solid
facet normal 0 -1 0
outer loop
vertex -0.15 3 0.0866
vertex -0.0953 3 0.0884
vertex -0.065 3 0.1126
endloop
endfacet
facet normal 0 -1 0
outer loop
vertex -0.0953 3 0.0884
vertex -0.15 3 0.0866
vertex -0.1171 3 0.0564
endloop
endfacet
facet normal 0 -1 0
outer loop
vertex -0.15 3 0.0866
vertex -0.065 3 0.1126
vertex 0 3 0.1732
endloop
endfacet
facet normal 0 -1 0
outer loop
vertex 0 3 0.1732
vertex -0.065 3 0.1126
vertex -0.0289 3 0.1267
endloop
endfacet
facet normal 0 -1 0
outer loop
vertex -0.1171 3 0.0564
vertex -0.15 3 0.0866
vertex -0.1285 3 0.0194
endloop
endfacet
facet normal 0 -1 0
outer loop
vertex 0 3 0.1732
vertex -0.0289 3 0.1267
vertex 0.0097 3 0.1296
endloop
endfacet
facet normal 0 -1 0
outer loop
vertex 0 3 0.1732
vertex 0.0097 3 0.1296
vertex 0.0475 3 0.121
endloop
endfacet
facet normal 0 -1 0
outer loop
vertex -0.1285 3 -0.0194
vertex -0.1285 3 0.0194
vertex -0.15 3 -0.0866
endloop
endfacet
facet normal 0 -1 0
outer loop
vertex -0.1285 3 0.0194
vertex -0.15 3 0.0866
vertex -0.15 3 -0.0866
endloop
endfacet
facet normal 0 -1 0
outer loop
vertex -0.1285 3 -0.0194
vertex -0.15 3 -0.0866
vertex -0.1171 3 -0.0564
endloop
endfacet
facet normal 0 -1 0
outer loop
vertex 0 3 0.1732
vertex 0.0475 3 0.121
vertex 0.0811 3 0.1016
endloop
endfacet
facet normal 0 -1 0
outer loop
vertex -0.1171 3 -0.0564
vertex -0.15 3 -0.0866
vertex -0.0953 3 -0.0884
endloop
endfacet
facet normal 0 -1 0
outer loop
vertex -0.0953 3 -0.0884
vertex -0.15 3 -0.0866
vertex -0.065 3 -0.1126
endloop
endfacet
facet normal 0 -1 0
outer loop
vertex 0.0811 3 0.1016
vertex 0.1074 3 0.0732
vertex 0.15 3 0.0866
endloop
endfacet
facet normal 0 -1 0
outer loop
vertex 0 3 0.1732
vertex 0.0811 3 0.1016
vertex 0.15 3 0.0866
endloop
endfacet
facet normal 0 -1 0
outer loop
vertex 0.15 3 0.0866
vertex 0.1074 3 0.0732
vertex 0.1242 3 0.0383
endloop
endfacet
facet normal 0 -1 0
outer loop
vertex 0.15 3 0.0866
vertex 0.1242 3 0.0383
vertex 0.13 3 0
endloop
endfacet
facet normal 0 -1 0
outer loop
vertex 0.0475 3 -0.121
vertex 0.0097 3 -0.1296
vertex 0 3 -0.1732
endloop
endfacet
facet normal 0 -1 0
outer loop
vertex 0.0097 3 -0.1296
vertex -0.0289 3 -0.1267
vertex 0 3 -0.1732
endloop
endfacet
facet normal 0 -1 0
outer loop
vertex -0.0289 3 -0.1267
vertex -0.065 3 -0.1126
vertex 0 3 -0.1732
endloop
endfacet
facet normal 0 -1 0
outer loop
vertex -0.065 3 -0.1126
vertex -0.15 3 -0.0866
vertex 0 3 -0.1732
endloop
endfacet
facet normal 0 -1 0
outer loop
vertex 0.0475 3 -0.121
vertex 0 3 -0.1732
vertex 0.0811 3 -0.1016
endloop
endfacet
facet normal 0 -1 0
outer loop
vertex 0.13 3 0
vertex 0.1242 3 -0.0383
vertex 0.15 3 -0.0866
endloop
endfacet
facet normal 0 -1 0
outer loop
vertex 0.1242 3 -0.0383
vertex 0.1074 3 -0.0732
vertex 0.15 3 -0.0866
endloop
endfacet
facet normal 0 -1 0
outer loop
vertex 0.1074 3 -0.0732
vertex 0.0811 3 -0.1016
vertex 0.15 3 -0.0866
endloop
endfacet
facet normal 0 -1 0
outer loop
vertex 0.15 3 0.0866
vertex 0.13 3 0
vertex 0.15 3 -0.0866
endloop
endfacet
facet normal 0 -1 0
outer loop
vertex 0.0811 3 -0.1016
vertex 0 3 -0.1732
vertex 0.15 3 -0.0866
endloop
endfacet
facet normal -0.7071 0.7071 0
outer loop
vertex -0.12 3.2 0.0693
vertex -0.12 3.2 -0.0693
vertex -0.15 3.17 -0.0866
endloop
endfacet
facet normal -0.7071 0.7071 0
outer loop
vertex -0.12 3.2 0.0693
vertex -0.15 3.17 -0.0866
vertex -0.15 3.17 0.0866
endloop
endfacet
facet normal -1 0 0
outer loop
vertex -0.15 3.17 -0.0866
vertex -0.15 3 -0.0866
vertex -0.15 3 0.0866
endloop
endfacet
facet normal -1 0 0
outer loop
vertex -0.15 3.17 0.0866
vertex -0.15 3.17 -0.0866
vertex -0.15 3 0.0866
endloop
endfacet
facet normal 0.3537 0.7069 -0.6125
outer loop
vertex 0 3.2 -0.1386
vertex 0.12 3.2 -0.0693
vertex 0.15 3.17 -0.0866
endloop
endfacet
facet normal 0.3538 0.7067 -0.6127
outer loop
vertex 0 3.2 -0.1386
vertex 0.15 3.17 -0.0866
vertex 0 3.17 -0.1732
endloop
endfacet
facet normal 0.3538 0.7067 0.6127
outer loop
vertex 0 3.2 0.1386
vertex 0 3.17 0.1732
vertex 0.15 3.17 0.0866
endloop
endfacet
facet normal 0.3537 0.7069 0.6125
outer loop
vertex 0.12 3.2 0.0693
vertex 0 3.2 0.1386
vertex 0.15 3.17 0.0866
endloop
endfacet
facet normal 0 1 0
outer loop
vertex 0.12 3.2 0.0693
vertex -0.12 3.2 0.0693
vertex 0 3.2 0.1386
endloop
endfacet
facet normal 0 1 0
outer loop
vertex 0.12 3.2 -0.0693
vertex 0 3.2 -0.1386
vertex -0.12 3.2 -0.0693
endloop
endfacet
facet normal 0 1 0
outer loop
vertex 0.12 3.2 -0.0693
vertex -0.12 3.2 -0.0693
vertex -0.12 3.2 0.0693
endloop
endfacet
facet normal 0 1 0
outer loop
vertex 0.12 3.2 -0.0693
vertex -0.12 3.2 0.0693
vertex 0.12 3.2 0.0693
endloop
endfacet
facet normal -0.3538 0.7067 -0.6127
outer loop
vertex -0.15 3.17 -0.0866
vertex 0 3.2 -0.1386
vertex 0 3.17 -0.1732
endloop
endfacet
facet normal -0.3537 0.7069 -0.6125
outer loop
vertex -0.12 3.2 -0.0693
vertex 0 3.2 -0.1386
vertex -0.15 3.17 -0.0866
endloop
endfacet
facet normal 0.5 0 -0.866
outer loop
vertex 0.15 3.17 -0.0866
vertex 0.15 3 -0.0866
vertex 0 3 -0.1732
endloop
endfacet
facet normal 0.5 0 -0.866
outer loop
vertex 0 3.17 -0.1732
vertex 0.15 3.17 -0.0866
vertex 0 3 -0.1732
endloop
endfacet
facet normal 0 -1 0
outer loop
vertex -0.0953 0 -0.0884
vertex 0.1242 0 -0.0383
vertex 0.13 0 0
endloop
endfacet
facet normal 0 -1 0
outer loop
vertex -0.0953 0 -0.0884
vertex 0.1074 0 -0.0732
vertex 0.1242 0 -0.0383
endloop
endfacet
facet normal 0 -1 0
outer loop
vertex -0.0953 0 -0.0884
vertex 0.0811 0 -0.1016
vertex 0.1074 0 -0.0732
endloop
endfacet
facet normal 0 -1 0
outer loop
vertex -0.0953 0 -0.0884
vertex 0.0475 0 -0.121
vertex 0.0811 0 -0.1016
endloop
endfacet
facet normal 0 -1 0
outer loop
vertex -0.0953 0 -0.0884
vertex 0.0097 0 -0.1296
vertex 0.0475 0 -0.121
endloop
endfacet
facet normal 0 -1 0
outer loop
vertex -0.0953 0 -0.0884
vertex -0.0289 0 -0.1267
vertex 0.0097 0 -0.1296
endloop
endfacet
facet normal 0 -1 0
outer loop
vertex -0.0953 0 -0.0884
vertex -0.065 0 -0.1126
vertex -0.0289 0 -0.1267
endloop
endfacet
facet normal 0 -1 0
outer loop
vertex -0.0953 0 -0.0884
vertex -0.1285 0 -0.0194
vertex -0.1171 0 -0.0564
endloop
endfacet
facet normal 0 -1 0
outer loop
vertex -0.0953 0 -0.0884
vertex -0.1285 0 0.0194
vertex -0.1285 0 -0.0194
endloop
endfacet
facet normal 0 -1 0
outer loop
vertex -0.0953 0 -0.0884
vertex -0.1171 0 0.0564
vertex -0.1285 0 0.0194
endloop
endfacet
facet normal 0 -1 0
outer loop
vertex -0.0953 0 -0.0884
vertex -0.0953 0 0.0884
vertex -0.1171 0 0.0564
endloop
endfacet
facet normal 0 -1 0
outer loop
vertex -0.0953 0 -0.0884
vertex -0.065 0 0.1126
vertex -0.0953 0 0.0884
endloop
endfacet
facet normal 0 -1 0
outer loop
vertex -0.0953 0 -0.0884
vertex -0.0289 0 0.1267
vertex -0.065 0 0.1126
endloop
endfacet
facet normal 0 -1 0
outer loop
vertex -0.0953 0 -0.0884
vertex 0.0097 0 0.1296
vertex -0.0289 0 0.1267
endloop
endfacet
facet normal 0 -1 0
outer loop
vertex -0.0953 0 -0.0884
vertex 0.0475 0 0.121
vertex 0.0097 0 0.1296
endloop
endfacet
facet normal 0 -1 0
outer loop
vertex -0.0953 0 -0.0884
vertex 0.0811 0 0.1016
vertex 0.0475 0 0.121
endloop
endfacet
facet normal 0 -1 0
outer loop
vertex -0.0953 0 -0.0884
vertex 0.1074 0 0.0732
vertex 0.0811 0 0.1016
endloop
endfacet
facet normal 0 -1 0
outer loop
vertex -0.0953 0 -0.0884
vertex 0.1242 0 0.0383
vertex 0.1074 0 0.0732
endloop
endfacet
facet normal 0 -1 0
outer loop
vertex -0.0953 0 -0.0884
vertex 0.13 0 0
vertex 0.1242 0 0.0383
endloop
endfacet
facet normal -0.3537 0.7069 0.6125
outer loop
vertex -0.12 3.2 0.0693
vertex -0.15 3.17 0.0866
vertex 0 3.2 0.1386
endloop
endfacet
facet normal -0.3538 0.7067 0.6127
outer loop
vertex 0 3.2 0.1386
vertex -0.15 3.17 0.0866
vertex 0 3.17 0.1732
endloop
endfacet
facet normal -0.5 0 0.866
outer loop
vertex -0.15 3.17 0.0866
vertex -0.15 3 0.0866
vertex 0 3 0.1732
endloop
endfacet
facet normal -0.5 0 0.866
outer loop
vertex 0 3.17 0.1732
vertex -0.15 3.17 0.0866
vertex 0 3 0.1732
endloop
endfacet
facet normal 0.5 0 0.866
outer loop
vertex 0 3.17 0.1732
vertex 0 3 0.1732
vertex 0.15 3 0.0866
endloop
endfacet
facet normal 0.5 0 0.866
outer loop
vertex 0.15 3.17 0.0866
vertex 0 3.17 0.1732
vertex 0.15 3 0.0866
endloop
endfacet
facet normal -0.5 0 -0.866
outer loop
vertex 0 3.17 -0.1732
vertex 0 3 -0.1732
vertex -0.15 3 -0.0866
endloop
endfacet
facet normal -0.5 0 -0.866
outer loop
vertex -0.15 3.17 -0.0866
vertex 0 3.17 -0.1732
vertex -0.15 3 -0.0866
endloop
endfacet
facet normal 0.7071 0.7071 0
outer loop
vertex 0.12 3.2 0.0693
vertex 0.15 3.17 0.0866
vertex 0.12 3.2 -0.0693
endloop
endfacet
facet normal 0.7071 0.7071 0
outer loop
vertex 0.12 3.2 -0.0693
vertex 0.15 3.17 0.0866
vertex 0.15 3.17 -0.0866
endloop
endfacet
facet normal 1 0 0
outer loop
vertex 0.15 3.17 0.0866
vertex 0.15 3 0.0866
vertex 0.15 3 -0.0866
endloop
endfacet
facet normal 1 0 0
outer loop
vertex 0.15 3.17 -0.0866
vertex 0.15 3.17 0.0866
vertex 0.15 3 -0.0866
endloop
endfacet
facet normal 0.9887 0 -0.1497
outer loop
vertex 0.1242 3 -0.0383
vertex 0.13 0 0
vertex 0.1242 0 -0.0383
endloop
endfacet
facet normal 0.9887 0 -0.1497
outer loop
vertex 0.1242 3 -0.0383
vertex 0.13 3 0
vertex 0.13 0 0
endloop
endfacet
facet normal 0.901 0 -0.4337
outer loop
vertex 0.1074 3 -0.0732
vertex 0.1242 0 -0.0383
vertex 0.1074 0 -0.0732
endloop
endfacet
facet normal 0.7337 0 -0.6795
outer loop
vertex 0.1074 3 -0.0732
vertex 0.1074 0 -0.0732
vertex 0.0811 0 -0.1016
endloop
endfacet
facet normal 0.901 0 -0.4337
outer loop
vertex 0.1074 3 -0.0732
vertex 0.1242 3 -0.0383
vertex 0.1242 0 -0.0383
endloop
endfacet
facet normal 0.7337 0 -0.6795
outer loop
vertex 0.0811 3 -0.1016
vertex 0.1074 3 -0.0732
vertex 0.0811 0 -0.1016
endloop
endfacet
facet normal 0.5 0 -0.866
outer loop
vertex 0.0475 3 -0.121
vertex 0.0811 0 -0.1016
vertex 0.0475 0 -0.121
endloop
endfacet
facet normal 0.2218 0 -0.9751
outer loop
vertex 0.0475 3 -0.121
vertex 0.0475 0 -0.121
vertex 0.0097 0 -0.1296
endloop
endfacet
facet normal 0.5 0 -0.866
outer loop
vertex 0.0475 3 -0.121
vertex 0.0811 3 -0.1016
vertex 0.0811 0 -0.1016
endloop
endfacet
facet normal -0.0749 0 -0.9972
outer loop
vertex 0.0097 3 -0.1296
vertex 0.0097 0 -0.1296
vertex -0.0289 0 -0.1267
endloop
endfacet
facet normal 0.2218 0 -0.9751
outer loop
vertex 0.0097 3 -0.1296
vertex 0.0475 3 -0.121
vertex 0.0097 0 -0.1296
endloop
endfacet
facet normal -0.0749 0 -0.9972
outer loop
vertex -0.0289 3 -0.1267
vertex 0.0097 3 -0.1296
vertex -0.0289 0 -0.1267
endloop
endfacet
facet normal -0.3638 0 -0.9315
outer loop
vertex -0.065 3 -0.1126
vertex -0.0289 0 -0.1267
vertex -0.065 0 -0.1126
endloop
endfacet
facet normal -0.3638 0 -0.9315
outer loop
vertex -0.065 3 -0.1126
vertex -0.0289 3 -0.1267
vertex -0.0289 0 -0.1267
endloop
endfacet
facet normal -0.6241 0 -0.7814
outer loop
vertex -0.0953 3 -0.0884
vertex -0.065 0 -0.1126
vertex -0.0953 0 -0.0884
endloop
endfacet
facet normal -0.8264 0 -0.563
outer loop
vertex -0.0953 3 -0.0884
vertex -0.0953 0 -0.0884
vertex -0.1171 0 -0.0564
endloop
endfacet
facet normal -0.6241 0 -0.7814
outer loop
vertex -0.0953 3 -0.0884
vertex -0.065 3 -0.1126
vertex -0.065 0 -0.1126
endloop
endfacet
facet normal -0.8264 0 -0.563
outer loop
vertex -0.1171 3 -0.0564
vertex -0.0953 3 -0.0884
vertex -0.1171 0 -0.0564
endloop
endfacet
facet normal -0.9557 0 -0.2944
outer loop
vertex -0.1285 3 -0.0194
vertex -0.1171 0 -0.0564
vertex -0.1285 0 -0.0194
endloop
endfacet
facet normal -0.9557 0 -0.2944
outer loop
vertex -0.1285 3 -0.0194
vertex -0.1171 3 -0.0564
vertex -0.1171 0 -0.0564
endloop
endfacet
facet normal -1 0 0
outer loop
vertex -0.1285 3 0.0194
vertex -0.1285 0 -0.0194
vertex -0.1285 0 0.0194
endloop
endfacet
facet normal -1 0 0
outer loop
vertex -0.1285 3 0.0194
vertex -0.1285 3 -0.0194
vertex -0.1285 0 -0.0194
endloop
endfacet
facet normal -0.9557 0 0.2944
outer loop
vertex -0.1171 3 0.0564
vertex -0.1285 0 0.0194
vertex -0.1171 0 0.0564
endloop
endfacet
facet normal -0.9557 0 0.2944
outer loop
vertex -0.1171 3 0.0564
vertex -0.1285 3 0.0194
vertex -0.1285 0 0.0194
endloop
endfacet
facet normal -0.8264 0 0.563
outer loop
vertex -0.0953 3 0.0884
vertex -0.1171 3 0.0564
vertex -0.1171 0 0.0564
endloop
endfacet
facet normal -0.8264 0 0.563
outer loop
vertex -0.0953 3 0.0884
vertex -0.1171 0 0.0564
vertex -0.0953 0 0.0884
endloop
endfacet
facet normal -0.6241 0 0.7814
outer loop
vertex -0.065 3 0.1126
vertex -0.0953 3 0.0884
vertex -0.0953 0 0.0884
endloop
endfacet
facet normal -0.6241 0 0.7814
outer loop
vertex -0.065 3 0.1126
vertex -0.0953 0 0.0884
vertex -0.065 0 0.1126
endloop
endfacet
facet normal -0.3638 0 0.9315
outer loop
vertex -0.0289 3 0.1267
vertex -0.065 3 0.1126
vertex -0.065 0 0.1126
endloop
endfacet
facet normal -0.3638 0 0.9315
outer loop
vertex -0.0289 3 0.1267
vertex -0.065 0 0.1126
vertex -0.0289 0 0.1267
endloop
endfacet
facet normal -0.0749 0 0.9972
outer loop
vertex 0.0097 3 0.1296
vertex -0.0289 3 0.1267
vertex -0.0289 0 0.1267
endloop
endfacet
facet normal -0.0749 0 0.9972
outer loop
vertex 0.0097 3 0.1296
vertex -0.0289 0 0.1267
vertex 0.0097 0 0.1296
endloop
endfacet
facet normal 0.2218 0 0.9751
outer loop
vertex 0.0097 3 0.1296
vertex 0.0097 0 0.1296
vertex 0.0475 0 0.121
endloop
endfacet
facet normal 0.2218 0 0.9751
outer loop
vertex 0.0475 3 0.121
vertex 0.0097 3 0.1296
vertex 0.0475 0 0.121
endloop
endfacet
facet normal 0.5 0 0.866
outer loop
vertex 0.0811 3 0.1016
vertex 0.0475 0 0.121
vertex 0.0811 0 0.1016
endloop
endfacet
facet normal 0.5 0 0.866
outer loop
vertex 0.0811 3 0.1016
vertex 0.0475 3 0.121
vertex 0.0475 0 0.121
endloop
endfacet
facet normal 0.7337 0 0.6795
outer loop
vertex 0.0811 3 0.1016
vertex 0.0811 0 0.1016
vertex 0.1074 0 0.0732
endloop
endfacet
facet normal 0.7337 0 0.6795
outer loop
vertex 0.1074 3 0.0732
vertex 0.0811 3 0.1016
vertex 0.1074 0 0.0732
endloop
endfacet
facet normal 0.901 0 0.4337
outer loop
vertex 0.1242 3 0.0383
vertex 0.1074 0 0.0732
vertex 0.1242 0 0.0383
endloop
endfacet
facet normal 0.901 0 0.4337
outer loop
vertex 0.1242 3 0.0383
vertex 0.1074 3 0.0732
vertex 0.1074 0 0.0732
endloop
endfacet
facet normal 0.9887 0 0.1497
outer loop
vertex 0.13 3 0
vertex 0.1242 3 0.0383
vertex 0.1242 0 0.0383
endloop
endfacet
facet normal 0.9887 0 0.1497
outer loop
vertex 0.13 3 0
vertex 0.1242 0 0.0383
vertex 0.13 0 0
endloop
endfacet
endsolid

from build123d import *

# Parameters (mm, degrees)
SKETCH1_W           = 0.13
SKETCH1_H           = 3
BOSS_EXTRUDE1_DEPTH = 0.2
CHAMFER5_SIZE       = 0.03


with BuildPart() as part:
    # Sketch1 → Revolve2 (revolve)
    with BuildSketch(Plane.XY):
        with Locations((0.065, 1.5)):
            Rectangle(SKETCH1_W, SKETCH1_H)
    revolve(axis=Axis((0, 0, 0), (0, 1, 0)))

    # Sketch3 → Boss-Extrude1 (add)
    with BuildSketch(Plane(origin=(0, 3, 0), x_dir=(1, 0, 0), z_dir=(0, 1, 0))):
        Polygon((0, 0.173205081), (-0.15, 0.08660254), (-0.15, -0.08660254), (0, -0.173205081), (0.15, -0.08660254), (0.15, 0.08660254), align=None)
    extrude(amount=BOSS_EXTRUDE1_DEPTH)

    # Chamfer5
    chamfer5_edges = [part.edges().sort_by_distance(p)[0] for p in [
        (0.075, 3.2, -0.129903811),
        (-0.075, 3.2, -0.129903811),
        (-0.15, 3.2, 0),
        (-0.075, 3.2, 0.129903811),
        (0.075, 3.2, 0.129903811),
        (0.15, 3.2, 0),
    ]]
    chamfer(chamfer5_edges, length=CHAMFER5_SIZE)


solid = part.part
